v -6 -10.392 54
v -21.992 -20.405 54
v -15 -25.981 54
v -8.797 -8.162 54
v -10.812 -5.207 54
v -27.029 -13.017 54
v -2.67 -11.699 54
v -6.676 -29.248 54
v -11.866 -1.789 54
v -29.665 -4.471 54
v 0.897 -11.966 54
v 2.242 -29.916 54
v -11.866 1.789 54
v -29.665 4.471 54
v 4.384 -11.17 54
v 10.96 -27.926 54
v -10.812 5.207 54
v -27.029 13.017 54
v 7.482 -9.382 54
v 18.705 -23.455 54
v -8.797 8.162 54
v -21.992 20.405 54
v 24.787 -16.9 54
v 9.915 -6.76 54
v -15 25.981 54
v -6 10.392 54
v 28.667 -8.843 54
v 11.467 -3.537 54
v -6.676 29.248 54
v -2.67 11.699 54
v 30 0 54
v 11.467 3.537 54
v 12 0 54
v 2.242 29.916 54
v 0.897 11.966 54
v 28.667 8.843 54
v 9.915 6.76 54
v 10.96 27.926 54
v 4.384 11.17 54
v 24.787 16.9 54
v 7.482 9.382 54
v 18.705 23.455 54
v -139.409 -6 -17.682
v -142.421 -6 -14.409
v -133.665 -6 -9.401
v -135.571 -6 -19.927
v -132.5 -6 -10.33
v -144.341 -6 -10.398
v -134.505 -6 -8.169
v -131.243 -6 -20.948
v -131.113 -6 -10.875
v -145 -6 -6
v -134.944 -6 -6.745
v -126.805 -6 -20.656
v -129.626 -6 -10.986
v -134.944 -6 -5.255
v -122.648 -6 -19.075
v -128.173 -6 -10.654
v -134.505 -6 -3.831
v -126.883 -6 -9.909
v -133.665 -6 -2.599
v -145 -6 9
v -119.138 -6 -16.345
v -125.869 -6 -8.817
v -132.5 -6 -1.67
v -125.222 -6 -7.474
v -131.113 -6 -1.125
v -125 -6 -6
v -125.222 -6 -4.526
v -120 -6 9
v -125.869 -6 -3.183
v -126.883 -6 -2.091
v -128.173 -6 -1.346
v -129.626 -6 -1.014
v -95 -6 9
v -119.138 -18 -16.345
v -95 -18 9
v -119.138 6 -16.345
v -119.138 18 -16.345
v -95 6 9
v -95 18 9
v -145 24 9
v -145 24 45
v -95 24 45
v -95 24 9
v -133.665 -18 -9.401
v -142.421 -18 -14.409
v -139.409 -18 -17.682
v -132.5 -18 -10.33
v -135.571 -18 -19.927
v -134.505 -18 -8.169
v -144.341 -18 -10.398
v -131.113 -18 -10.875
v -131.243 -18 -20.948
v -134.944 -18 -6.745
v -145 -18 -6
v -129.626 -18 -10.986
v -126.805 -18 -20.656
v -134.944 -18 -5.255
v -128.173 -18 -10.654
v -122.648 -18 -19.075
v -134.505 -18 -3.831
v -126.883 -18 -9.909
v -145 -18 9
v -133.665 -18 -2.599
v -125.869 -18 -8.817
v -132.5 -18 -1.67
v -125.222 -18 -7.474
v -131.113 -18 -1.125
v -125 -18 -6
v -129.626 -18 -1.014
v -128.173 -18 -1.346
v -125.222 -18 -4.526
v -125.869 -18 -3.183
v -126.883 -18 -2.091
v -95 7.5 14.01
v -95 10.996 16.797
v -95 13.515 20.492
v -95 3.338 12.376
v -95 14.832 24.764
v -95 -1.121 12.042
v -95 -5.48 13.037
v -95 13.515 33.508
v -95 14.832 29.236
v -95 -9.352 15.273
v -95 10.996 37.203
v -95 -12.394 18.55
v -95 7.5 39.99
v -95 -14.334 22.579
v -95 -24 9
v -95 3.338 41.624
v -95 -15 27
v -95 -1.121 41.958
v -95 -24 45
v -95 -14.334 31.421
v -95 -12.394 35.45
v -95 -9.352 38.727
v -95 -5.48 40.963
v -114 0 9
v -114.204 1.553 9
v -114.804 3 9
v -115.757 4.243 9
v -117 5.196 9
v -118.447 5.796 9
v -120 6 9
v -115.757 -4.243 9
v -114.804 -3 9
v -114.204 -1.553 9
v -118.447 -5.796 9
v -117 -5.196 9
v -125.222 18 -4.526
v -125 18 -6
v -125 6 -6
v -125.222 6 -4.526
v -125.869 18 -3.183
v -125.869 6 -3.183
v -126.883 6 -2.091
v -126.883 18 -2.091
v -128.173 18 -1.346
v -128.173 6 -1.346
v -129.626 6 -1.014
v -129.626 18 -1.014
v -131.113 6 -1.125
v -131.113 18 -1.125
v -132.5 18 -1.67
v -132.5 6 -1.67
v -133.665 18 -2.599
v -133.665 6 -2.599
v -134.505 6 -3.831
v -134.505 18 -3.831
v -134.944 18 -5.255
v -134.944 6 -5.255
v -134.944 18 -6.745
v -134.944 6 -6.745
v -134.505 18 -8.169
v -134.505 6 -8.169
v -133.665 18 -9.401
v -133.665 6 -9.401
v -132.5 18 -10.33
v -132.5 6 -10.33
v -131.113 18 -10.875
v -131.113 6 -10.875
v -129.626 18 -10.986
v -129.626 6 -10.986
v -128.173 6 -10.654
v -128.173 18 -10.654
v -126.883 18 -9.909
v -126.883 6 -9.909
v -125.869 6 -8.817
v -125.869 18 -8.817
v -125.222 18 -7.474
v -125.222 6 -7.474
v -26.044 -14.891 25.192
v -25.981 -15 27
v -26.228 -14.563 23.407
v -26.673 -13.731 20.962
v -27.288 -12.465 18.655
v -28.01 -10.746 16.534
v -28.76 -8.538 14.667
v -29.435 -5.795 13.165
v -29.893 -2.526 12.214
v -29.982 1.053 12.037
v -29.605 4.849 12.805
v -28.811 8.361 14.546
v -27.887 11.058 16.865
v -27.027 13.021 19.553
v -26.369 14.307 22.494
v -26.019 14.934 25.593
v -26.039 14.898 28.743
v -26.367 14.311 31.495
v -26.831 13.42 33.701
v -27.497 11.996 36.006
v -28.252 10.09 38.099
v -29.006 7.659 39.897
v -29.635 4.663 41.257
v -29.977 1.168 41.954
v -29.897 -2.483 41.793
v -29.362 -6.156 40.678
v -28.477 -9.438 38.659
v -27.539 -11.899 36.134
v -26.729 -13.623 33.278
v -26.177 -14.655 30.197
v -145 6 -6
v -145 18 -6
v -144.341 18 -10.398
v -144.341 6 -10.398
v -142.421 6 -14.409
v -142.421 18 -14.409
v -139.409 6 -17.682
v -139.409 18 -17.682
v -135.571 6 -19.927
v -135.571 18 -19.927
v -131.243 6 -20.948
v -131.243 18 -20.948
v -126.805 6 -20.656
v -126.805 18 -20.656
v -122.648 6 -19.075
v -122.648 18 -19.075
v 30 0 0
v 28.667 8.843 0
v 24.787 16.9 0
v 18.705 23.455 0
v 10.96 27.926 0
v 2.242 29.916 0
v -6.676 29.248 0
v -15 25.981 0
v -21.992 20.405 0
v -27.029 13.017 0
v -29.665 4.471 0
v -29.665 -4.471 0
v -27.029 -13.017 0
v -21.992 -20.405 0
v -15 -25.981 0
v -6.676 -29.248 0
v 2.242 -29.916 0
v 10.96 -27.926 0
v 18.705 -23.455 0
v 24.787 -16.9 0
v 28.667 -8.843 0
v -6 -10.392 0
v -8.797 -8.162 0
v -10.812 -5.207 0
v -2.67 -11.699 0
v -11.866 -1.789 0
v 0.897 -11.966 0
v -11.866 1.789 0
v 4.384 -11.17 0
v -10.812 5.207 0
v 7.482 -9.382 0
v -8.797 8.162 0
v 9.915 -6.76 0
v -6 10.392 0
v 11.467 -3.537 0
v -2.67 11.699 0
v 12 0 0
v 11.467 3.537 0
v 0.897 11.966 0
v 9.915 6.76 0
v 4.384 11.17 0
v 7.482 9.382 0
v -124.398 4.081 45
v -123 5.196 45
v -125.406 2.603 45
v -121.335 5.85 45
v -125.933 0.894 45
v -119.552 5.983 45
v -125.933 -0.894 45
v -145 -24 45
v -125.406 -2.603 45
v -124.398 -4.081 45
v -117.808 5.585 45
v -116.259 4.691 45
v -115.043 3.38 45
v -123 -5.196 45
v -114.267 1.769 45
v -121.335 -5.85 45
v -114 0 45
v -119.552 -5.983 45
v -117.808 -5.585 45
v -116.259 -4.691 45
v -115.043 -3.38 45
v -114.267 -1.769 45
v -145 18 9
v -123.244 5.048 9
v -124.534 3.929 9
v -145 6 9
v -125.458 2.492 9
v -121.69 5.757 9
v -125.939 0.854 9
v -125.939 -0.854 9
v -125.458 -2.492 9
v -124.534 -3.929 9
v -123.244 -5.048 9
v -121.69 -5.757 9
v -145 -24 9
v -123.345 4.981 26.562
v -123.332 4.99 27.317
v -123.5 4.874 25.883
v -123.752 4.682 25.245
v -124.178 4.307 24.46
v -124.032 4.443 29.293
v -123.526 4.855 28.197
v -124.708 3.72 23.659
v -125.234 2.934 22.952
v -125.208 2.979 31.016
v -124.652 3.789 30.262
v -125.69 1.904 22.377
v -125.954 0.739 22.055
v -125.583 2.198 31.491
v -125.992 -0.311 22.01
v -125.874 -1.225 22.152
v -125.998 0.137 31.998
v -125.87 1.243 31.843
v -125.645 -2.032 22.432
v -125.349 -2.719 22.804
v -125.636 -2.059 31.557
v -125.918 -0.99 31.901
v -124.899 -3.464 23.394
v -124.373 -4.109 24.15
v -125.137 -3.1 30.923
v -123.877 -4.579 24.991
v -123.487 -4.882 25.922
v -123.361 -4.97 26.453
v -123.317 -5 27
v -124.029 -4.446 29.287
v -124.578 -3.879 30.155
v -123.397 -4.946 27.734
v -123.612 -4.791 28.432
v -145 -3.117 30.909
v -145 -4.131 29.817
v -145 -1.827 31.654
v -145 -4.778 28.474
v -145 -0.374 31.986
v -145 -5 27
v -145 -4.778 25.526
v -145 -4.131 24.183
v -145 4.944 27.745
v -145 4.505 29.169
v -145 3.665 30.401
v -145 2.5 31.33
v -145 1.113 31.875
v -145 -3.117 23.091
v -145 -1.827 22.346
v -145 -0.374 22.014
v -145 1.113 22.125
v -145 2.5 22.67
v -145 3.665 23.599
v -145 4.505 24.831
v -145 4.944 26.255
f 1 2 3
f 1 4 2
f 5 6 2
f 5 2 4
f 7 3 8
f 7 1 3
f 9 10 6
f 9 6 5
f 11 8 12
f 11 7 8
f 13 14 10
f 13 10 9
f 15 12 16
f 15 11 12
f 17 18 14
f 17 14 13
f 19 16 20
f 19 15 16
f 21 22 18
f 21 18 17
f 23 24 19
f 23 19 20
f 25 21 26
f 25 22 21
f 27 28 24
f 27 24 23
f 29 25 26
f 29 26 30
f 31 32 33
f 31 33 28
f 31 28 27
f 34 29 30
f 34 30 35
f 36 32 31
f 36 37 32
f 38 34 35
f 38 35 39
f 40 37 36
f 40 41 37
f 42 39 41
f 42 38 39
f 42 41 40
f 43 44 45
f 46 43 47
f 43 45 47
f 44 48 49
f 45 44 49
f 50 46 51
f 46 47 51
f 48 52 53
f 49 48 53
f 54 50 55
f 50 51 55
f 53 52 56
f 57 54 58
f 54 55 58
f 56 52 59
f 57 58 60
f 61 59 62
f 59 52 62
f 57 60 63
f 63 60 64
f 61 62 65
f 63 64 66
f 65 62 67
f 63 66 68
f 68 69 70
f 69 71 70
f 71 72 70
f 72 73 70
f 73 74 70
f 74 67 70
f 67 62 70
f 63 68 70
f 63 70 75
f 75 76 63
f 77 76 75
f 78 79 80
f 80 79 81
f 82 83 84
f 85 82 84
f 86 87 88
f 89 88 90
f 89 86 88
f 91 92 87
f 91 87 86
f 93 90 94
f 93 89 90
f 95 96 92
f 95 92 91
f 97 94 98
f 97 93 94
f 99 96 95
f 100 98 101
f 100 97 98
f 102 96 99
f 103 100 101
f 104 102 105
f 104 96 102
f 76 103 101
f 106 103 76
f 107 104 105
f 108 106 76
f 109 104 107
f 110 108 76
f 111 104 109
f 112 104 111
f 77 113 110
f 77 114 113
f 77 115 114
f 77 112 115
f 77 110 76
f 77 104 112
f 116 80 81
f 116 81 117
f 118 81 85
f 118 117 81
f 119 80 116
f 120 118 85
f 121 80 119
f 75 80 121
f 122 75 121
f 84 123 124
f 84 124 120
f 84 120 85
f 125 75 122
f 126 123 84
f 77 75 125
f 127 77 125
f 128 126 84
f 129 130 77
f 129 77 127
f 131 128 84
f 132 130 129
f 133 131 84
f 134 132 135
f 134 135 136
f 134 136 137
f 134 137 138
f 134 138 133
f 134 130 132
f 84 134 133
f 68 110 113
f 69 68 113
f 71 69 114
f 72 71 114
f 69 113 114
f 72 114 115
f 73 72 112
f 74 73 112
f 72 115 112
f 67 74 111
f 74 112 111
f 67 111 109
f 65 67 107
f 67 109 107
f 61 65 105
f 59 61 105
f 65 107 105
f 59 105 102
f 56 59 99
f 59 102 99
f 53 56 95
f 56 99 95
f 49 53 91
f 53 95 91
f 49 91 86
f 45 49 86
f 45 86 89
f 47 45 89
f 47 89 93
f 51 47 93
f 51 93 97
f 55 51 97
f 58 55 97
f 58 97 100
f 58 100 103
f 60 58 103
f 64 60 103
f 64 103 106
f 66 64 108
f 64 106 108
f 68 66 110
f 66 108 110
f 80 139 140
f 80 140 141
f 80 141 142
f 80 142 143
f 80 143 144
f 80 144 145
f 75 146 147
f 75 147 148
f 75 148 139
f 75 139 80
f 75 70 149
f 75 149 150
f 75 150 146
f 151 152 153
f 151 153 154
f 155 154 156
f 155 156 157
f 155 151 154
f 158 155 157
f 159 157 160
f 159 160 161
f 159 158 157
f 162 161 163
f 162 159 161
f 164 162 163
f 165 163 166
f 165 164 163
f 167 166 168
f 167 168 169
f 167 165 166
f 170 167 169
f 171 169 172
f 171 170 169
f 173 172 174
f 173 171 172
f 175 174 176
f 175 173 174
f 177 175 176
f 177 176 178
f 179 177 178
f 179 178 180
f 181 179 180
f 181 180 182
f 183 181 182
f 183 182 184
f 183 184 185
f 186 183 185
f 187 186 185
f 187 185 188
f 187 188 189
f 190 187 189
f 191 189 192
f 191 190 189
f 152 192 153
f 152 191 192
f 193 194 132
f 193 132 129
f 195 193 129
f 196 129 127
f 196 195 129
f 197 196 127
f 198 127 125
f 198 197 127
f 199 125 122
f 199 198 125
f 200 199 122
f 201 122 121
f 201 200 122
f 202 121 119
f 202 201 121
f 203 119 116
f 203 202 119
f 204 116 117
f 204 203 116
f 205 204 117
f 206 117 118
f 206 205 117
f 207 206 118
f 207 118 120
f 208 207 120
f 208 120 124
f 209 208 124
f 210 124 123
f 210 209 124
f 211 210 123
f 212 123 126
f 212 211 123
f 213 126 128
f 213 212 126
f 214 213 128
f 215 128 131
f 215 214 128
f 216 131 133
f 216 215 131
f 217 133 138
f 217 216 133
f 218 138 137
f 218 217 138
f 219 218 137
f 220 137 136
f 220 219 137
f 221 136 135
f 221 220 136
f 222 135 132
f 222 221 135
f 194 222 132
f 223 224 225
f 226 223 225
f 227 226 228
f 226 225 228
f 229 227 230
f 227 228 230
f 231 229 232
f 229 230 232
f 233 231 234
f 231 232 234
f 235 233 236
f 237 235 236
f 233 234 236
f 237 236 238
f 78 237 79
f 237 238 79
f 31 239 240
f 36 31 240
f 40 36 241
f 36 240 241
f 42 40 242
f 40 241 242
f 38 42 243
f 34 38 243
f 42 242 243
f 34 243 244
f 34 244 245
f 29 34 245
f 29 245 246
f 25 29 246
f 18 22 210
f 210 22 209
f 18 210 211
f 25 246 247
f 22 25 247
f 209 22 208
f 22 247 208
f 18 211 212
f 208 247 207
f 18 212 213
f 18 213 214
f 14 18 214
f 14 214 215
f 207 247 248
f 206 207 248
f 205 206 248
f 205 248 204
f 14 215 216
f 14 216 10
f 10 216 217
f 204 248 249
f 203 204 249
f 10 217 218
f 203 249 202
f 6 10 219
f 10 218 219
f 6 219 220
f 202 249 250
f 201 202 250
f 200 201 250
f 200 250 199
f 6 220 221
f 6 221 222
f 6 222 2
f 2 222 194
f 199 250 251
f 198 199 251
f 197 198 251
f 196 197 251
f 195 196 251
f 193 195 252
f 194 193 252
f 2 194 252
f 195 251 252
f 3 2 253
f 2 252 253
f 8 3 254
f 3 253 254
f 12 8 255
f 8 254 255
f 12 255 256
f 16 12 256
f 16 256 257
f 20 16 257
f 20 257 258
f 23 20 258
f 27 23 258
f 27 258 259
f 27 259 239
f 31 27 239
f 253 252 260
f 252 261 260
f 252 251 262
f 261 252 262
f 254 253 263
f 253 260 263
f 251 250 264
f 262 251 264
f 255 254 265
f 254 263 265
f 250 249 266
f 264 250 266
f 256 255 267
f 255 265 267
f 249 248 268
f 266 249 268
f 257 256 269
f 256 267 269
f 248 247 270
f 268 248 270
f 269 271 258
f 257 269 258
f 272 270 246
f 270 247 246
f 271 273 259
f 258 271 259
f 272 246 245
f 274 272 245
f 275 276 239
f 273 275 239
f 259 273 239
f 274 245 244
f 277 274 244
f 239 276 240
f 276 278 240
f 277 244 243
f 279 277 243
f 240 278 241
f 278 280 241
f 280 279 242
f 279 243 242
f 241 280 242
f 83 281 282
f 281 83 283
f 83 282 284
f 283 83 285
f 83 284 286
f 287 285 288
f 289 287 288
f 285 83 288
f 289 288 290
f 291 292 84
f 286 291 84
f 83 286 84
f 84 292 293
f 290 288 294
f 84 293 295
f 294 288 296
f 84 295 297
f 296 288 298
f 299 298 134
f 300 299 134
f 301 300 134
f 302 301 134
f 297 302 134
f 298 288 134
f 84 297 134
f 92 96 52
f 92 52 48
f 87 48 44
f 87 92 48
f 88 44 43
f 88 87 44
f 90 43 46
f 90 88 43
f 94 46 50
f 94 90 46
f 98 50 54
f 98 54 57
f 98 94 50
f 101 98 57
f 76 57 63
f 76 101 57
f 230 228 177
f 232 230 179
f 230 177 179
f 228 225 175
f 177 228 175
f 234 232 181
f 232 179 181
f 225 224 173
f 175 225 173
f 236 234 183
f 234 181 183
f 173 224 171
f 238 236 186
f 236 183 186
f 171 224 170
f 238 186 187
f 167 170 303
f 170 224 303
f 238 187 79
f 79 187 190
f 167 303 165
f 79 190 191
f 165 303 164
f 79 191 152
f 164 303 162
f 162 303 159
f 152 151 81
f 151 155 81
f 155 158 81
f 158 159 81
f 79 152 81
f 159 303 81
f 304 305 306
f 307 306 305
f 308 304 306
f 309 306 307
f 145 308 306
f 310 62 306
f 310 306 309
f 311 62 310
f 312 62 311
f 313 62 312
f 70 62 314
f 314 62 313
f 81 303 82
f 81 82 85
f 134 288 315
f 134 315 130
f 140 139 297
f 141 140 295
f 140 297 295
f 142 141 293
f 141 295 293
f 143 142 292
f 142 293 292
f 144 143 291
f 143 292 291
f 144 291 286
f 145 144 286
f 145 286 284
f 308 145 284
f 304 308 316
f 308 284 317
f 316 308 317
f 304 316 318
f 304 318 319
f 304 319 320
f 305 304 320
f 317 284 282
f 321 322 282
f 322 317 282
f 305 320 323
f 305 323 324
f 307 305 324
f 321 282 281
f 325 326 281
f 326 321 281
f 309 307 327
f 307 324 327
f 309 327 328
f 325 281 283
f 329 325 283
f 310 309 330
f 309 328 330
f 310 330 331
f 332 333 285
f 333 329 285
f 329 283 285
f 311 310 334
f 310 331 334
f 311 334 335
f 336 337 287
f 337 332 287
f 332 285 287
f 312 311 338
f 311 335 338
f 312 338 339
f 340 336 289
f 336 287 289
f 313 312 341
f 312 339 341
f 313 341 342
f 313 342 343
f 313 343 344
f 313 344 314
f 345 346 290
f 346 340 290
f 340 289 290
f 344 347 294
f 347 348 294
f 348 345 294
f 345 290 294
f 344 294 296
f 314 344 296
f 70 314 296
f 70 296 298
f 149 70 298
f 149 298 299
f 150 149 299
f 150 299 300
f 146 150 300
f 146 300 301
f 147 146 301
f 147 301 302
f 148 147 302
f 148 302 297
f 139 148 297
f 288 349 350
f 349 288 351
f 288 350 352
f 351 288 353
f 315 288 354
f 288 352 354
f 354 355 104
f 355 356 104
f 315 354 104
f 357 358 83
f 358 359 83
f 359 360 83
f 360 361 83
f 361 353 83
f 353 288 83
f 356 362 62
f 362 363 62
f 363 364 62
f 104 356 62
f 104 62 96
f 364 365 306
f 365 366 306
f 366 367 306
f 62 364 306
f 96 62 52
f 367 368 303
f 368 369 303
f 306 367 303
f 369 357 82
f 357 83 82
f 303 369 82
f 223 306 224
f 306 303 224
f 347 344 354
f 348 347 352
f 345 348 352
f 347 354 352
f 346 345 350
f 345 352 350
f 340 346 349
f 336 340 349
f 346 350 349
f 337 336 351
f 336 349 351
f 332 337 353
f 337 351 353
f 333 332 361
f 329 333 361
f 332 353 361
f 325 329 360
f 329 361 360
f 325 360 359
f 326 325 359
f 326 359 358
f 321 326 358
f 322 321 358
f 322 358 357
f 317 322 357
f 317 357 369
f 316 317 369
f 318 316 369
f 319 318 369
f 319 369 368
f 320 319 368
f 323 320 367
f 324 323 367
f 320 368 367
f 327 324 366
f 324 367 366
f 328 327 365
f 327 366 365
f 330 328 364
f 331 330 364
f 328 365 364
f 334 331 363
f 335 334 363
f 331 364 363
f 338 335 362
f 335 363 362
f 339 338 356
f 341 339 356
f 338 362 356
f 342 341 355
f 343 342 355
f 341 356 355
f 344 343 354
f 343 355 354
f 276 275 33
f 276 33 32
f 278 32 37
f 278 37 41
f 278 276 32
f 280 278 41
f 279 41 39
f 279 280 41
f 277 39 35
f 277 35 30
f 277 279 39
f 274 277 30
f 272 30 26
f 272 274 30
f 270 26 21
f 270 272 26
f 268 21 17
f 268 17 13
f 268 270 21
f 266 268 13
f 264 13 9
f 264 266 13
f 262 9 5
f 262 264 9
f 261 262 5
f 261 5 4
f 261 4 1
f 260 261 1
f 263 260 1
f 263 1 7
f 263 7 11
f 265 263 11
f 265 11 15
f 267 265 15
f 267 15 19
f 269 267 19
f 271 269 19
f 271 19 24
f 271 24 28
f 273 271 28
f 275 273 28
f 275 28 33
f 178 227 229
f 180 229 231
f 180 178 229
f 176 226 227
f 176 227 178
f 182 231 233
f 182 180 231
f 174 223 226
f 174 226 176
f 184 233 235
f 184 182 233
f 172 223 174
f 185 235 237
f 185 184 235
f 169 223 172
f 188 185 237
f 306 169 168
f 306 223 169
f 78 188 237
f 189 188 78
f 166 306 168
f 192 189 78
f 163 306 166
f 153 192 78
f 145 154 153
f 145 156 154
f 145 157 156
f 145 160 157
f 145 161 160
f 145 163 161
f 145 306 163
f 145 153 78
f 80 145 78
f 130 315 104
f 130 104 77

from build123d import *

# Parameters (mm, degrees)
F0_R      = 30
F0_R_2    = 12
F1_DEPTH  = 54
F2_W      = 50
F2_H      = 36
F3_DEPTH  = 24
F6_W      = 120
F6_H      = 15
F8_R      = 6
F9_DEPTH  = 36
F10_R     = 5
F11_DEPTH = 21.6843753096
F13_R     = 5
F14_DEPTH = 12
F16_R     = 12
F17_DEPTH = 75.001


with BuildPart() as f1:
    # F0 (on Top) → F1 (new body)
    with BuildSketch(Plane.XY):
        Circle(F0_R)
        Circle(F0_R_2, mode=Mode.SUBTRACT)
    extrude(amount=F1_DEPTH)



with BuildPart() as f3:
    # F2 (on Front) → F3 (new body, symmetric)
    with BuildSketch(Plane.XZ):
        with Locations((-120, 27)):
            Rectangle(F2_W, F2_H)
    extrude(amount=F3_DEPTH, both=True)


with BuildPart() as f1_1:
    add(f1.part)

    add(f3.part)  # F7 merges F3
    # F6 (on offset) → F7 (revolve)
    with BuildSketch(Plane.XY.offset(27)):
        with Locations((-60, -7.5)):
            Rectangle(F6_W, F6_H)
    revolve(axis=Axis((-60, 0, 27), (1, 0, 0)))

    # F8 (on face) → F9 (cut, through all)
    with BuildSketch(Plane.XY.offset(45)):
        with Locations((-120, 0)):
            Circle(F8_R)
    extrude(amount=-F9_DEPTH, mode=Mode.SUBTRACT)

    # F10 (on face) → F11 (cut, through all)
    with BuildSketch(Plane(origin=(-145, 0, 0), x_dir=(0, -1, 0), z_dir=(-1, 0, 0))):
        with Locations((0, 27)):
            Circle(F10_R)
    extrude(amount=-F11_DEPTH, mode=Mode.SUBTRACT)

    # F13 (on offset) → F14 (join)
    with BuildSketch(Plane.XZ.offset(18)):
        with BuildLine():
            Line((-119.1379310345, -16.3448275862), (-95, 9))
            Line((-95, 9), (-145, 9))
            Line((-145, 9), (-145, -6))
            ThreePointArc((-145, -6), (-135.5708601453, -19.9271503633), (-119.1379310345, -16.3448275862))
        make_face()
        with Locations((-130, -6)):
            Circle(F13_R, mode=Mode.SUBTRACT)
    extrude(amount=-F14_DEPTH)

    # F15: F1 across plane


with BuildPart() as f1_2:
    add(f1_1.part)
    add(f1_1.part.mirror(Plane.XZ))

    # F16 (on face) → F17 (cut, through all)
    with BuildSketch(Plane.XY.offset(54)):
        Circle(F16_R)
    extrude(amount=-F17_DEPTH, mode=Mode.SUBTRACT)


solid = f1_2.part
